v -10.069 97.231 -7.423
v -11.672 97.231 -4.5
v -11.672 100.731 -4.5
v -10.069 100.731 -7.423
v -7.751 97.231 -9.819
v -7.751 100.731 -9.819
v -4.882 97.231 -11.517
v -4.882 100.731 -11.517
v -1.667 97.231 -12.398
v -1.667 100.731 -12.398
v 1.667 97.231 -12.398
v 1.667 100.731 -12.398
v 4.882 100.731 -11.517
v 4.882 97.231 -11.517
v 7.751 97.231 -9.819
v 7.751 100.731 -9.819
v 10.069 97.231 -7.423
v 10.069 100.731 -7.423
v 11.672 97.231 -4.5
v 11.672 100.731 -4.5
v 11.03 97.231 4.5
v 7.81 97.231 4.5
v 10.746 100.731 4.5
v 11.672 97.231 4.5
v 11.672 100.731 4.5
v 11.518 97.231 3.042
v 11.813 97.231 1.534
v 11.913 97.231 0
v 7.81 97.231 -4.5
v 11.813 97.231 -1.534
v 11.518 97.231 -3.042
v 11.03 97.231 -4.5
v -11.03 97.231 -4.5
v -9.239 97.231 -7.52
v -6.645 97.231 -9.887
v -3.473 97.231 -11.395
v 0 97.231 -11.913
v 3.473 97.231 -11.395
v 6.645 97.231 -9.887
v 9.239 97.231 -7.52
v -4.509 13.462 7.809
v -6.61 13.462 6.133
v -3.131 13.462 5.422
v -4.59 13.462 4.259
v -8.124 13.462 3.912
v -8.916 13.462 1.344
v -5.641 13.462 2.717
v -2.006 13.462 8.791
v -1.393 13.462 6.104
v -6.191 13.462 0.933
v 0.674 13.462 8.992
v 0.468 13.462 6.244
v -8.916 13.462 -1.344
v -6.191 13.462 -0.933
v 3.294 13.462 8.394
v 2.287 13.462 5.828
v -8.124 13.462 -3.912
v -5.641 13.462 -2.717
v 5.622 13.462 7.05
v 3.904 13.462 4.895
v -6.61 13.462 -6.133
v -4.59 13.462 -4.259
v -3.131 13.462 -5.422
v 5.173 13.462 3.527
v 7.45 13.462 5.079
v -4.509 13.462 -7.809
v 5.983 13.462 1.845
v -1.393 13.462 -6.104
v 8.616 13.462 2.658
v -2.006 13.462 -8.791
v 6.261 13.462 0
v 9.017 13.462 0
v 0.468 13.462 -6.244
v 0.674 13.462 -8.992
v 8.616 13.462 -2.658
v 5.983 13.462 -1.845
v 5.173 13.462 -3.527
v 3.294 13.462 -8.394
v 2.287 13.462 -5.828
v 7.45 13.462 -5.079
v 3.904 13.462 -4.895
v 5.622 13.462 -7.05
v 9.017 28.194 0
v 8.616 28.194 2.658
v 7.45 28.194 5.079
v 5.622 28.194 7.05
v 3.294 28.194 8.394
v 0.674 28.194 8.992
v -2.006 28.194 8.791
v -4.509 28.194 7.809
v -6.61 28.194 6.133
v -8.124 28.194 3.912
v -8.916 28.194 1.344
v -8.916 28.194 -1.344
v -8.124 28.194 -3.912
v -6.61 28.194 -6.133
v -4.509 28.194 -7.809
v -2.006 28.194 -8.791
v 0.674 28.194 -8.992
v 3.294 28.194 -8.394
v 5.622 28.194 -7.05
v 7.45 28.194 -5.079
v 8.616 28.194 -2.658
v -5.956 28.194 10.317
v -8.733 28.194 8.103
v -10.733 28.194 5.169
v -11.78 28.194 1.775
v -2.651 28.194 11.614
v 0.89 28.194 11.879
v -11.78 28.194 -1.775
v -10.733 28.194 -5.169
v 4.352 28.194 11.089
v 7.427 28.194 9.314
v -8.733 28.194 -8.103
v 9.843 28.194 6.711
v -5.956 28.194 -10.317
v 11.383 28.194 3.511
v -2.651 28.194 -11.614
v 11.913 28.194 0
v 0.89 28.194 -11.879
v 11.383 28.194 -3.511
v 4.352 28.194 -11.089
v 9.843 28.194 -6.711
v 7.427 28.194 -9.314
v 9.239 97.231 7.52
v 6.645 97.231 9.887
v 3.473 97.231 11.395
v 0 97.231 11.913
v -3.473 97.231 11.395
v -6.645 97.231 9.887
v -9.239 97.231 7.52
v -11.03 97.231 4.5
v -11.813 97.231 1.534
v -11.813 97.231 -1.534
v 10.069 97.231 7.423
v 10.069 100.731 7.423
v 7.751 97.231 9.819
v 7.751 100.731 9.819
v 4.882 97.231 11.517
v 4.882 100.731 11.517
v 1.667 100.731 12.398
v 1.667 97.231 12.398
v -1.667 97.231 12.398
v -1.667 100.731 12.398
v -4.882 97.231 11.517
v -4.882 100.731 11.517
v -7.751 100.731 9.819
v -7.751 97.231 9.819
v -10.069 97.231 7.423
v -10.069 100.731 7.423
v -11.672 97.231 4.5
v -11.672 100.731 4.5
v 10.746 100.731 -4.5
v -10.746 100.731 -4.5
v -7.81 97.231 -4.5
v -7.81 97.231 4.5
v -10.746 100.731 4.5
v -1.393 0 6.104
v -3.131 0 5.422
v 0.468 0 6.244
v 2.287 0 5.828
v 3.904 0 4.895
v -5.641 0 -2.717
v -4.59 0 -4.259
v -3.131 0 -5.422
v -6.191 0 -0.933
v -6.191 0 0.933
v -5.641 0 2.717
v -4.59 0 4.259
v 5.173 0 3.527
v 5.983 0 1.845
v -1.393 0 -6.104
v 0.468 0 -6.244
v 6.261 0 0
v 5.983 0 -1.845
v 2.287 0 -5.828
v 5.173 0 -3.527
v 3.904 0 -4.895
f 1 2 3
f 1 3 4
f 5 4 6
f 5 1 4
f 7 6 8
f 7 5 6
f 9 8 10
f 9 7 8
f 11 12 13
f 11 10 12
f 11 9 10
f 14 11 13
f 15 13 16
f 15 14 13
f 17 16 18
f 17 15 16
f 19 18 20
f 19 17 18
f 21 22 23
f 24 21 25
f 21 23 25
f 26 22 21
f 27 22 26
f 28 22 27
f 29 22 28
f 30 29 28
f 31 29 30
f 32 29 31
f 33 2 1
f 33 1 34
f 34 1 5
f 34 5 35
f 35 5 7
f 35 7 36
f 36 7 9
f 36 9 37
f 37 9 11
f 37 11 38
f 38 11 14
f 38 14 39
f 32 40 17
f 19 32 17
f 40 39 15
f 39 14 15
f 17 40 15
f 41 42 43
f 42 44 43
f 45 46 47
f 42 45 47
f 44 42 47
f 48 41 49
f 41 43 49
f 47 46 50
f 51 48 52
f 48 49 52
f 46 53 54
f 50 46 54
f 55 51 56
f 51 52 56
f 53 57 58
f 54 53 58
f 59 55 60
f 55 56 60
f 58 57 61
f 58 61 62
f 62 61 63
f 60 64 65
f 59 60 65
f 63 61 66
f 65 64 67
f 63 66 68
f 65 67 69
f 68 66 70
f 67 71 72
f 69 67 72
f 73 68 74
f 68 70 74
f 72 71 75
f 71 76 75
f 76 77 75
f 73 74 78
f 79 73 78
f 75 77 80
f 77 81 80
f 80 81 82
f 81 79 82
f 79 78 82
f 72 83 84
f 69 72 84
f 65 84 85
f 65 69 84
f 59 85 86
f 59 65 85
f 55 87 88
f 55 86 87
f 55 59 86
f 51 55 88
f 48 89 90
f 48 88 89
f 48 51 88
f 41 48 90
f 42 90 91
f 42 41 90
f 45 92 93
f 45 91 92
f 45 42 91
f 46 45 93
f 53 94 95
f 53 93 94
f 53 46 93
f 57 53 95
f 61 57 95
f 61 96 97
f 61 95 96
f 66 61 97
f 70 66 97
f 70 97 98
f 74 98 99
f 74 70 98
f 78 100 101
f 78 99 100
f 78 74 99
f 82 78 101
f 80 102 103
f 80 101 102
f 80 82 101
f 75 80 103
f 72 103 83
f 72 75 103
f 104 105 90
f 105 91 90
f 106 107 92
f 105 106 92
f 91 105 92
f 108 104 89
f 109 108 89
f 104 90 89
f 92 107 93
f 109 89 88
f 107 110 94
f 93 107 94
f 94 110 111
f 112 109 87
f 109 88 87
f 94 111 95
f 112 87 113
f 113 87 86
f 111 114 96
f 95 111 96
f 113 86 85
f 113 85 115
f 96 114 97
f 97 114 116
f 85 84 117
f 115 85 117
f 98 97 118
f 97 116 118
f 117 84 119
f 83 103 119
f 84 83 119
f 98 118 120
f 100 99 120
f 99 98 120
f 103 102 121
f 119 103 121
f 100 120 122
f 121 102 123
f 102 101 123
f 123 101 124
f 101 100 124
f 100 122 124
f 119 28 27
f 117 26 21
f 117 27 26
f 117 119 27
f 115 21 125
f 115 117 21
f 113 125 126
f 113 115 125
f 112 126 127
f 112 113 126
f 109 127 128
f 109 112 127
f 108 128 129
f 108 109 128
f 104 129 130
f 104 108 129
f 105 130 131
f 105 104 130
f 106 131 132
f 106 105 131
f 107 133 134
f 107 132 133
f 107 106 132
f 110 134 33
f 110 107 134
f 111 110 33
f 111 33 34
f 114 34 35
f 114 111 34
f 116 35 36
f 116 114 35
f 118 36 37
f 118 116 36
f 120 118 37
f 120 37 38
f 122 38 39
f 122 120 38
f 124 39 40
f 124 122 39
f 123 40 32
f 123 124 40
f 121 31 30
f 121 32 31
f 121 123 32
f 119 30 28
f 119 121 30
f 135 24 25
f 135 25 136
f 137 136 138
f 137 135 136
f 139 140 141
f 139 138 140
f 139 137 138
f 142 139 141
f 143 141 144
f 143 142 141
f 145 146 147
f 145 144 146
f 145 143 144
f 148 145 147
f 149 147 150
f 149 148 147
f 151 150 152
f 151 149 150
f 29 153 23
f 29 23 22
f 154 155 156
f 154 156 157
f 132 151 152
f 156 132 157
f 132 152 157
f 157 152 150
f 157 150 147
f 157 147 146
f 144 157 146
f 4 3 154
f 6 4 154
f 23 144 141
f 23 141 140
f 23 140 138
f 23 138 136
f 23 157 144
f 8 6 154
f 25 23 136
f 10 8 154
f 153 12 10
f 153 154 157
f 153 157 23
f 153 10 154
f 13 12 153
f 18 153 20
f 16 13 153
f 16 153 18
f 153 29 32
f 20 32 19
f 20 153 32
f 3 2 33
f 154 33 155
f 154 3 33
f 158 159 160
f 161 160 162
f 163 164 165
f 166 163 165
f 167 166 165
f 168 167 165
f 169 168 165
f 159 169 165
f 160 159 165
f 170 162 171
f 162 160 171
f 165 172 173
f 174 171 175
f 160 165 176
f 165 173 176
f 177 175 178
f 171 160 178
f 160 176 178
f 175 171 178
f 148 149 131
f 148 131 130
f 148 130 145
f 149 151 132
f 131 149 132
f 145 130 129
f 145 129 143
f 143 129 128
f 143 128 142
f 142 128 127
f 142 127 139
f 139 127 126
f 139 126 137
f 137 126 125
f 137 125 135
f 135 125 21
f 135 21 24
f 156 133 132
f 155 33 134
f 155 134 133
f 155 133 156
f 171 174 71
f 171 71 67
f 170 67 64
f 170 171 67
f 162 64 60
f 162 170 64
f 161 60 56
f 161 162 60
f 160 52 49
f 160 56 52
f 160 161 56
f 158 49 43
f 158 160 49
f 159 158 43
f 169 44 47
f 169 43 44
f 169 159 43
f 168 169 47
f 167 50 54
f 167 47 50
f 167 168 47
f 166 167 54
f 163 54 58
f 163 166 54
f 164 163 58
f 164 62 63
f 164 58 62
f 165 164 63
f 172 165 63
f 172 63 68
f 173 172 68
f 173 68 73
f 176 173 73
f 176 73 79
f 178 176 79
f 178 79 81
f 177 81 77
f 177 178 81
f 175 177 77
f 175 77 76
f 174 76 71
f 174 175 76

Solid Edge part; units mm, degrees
sketch "Sketch1" plane through (0, 0, 0) normal (0, 0, 1) x (1, 0, 0)
  line L0 (11.9126, 97.2312) -> (11.9126, 28.194)
  line L1 (11.9126, 28.194) -> (9.017, 28.194)
  line L2 (9.017, 28.194) -> (9.017, 13.462)
  line L3 (9.017, 13.462) -> (6.2611, 13.462)
  line L4 (6.2611, 13.462) -> (6.2611, 0)
  line L5 (6.2611, 0) -> (0, 0)
  line L6 (0, 0) -> (0, 100.7312)
  line L7 (0, 100.7312) -> (12.5095, 100.7312)
  line L8 (12.5095, 100.7312) -> (12.5095, 97.2312)
  line L9 (12.5095, 97.2312) -> (11.9126, 97.2312)
revolve "RevolvedProtrusion1" add sketch "Sketch1" angle 360 about axis through (0, 0, 0) along (0, 1, 0)
sketch "Sketch2" plane through (0, 0, 0) normal (0, 0, 1) x (1, 0, 0)
  line L0 (7.8095, 97.2312) -> (12.5095, 97.2312)
  line L1 (12.5095, 97.2312) -> (12.5095, 100.7312)
  line L2 (12.5095, 100.7312) -> (10.7463, 100.7312)
  line L3 (10.7463, 100.7312) -> (7.8095, 97.2312)
extrude "Cutout1" cut sketch "Sketch2" along normal mid plane 9
mirror "Mirror1" about plane through (0, 0, 0) normal (1, 0, 0) of "Cutout1"
